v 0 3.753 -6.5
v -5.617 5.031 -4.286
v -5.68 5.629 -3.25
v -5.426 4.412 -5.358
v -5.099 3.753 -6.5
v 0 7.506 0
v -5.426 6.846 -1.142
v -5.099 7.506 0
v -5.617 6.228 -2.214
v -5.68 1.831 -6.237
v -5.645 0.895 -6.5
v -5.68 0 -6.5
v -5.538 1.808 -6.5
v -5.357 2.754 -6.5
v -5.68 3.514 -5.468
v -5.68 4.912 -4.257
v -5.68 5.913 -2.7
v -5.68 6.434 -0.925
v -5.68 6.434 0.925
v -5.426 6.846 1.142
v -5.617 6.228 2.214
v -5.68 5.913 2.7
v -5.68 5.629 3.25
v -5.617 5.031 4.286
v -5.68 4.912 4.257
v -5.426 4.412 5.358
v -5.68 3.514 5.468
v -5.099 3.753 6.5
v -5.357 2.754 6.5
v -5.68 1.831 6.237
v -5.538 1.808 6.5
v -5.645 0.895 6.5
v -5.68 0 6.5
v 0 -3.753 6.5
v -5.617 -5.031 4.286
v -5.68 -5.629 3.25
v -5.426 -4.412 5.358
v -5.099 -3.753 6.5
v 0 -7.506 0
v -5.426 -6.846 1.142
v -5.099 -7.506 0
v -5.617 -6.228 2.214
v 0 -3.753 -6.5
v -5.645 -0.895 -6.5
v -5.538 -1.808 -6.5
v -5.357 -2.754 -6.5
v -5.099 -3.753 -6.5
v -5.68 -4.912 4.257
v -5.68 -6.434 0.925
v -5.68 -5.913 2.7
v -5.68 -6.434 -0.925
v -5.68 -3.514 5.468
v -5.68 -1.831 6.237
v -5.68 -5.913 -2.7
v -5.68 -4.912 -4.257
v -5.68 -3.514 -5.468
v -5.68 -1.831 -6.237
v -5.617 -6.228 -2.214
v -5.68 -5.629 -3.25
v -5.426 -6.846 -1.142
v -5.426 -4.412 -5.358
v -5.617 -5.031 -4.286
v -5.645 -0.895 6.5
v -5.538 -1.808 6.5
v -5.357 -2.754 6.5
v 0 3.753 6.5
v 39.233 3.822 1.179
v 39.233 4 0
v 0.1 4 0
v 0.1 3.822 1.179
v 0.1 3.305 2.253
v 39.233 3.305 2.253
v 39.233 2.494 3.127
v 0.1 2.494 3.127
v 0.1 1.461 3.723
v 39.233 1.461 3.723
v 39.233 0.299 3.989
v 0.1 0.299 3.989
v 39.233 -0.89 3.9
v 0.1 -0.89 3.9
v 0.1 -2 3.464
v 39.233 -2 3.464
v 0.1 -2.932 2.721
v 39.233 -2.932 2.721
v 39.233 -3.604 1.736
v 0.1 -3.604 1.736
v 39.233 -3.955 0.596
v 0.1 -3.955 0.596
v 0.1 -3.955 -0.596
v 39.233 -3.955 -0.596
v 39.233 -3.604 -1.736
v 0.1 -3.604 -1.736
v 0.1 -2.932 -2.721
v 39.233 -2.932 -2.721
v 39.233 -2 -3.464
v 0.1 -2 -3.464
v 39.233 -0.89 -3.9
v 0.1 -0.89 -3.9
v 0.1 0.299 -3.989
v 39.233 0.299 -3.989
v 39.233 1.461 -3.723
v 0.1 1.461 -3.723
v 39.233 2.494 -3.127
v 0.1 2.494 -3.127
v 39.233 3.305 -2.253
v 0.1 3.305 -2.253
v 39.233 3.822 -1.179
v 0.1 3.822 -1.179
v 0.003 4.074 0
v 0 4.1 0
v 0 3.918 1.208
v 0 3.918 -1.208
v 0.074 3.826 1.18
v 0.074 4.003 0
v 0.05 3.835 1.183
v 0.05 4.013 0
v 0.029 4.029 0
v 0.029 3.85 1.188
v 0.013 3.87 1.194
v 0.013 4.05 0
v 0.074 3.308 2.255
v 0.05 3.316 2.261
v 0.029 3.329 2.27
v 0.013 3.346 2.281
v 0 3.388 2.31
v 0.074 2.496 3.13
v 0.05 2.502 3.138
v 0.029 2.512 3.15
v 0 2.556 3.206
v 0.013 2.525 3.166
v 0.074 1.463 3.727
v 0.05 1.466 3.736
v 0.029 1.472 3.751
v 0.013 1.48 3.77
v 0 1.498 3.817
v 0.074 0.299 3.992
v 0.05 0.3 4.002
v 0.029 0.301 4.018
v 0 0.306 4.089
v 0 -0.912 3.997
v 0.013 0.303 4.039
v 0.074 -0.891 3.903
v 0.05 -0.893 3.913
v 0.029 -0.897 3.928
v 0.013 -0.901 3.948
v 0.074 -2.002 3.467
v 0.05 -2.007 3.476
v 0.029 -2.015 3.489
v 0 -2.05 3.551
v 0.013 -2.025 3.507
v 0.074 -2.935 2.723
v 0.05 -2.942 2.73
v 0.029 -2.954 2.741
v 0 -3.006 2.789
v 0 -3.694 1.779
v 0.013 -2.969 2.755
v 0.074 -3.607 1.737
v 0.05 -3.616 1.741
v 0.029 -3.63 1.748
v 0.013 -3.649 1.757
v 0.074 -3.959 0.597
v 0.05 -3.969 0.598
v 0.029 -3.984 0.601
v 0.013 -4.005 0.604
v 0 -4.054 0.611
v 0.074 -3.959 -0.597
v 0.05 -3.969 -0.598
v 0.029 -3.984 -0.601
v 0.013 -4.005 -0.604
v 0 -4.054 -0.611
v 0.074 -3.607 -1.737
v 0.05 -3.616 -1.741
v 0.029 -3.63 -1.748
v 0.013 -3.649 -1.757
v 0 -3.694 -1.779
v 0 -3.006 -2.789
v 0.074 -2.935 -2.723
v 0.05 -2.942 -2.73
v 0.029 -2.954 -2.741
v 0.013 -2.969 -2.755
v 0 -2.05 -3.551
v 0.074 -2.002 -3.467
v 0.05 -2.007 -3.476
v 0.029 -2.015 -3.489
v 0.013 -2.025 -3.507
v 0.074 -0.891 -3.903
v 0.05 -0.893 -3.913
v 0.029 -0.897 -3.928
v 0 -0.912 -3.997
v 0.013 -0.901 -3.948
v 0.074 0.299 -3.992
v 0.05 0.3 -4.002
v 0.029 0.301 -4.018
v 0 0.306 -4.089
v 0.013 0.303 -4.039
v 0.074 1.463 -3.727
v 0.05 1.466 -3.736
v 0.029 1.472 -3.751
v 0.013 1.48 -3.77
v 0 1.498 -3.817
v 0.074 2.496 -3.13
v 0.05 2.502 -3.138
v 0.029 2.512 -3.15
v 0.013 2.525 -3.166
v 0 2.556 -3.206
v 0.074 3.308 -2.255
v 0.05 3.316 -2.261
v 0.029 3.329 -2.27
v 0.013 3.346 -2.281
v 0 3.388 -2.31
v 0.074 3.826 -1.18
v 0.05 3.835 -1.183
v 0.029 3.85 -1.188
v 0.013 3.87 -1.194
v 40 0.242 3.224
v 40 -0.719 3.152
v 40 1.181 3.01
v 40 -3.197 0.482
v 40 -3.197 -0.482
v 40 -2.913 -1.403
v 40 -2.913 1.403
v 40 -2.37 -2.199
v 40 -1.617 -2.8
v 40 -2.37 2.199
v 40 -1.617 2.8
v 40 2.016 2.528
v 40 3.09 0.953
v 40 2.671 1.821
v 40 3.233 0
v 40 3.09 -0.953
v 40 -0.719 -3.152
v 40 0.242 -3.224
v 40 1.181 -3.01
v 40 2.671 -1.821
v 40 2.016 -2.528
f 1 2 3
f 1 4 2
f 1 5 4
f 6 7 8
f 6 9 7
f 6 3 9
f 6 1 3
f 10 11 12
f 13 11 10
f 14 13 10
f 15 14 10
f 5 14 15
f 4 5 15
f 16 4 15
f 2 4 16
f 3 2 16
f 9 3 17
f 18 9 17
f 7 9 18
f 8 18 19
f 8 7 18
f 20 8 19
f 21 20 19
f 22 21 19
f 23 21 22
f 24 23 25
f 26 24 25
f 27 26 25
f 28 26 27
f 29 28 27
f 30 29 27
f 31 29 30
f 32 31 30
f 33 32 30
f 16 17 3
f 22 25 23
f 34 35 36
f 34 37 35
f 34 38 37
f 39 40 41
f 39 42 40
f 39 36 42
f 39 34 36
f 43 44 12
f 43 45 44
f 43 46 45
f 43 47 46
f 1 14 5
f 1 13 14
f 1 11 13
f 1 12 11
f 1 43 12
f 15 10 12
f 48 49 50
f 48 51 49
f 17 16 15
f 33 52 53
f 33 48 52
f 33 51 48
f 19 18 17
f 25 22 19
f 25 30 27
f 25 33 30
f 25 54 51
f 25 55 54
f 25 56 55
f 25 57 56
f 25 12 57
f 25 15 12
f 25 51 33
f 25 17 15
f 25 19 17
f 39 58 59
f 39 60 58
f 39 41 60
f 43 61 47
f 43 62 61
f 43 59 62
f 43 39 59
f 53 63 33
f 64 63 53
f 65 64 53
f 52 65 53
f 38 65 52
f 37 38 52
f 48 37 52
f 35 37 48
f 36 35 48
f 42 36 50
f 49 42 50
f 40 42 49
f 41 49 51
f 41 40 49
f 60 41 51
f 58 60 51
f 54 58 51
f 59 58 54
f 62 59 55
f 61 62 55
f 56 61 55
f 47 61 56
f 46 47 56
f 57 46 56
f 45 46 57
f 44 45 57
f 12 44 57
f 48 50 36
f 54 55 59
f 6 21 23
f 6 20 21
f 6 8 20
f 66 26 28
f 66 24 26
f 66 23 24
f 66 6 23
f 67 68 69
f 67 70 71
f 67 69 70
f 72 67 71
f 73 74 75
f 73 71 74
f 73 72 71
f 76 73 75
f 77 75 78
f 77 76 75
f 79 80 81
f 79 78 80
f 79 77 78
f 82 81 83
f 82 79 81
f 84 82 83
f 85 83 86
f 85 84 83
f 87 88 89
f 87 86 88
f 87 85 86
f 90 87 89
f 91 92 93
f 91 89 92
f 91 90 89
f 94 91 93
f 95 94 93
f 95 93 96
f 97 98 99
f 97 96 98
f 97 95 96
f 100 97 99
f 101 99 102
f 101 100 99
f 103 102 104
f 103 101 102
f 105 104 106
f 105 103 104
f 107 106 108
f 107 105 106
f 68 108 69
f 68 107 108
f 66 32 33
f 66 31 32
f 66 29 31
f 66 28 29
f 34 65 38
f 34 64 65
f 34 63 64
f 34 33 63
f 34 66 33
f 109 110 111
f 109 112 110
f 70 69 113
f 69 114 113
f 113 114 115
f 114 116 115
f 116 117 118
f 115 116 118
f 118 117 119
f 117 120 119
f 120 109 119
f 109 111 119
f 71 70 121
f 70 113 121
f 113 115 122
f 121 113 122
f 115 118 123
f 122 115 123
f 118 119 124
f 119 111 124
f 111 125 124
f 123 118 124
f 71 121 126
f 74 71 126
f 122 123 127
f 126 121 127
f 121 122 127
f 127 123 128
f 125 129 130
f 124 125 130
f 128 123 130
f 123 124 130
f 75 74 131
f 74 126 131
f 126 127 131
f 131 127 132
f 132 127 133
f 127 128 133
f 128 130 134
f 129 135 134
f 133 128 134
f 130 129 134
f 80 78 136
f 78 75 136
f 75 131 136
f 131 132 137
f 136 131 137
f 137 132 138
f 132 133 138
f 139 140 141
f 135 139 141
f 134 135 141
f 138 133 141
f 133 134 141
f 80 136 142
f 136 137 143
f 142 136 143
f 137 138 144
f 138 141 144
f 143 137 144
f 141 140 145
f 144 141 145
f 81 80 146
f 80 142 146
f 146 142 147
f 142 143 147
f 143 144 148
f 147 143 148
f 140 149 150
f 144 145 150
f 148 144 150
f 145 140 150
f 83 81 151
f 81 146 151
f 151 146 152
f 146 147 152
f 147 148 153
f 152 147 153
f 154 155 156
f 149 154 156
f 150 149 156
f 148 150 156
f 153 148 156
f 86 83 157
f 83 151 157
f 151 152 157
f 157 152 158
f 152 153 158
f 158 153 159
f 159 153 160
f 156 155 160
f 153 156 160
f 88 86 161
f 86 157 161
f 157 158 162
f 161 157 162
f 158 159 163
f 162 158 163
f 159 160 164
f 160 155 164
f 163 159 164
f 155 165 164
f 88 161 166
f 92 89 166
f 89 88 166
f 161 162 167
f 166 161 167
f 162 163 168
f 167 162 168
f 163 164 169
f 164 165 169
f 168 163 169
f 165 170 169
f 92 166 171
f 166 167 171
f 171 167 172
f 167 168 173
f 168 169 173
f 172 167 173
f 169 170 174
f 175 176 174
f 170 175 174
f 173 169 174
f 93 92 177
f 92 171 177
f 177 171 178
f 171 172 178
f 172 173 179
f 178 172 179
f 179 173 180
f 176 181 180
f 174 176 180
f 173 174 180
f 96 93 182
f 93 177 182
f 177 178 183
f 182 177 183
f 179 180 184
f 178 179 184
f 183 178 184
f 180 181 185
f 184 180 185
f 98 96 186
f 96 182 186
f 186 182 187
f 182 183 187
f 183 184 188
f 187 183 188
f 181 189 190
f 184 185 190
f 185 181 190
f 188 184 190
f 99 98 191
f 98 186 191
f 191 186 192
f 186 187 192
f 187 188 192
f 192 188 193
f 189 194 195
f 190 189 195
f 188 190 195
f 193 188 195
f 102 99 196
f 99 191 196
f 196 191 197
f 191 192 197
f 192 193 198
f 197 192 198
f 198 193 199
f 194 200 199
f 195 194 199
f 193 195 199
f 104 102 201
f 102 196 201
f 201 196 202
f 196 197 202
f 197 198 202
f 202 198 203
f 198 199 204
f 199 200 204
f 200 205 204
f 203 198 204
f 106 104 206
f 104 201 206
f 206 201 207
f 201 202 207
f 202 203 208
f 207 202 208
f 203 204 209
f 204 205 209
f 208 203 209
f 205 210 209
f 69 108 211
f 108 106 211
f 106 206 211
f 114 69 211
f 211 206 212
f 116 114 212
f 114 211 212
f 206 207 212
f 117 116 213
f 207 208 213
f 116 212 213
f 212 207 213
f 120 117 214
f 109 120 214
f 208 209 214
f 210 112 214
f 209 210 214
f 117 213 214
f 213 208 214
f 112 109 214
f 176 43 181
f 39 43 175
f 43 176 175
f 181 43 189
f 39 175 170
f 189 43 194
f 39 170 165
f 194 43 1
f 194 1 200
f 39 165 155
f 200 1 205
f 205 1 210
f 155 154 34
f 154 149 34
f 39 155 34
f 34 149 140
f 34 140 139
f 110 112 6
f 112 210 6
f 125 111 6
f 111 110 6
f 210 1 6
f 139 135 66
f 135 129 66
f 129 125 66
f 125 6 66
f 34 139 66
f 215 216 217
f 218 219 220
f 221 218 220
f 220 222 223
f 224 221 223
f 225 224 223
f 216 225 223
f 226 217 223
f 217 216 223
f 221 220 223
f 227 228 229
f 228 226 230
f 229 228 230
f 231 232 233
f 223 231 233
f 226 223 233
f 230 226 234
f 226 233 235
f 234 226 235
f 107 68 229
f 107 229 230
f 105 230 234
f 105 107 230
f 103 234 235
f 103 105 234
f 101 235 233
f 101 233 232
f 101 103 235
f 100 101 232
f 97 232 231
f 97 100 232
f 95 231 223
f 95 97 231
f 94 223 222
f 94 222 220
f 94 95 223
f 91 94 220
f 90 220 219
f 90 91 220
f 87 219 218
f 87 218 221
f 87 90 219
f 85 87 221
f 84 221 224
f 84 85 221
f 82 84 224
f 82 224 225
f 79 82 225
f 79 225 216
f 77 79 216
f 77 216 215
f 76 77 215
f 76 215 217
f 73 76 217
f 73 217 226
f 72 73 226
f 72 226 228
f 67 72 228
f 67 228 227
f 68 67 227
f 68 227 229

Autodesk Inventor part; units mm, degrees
ref_plane "YZ Plane" through (0, 0, 0) normal (1, 0, 0) x (0, 1, 0)
ref_plane "XZ Plane" through (0, 0, 0) normal (0, 1, 0) x (-1, 0, 0)
sketch "Sketch1" plane through (0, 0, 0) normal (0, 0, 1) x (1, 0, 0)
  line L0 (0, 4) -> (40, 4)
  line L1 (40, 4) -> (40, 0)
  line L2 (40, 0) -> (0, 0)
  line L3 (-8, 0) -> (48, 0) projected
  line L4 (0, -0.8) -> (0, 4.8) projected
  line L5 (0, 4) -> (0, 0)
  dimension "d2" = 8
  dimension "d59" = 40
revolve "Body" add sketch "Sketch1" angle 360 about axis through (40, 0, 0) along (-1, 0, 0)
sketch "Sketch2" plane through (0, 0, 0) normal (-1, 0, 0) x (0, 0, 1)
  line L0 (0, 7.5056) -> (6.5, 3.7528)
  line L1 (6.5, 3.7528) -> (6.5, -3.7528)
  line L2 (6.5, -3.7528) -> (0, -7.5056)
  line L3 (0, -7.5056) -> (-6.5, -3.7528)
  line L4 (-6.5, -3.7528) -> (-6.5, 3.7528)
  line L5 (-6.5, 3.7528) -> (0, 7.5056)
  line L6 (-9.1, 0) -> (9.1, 0) projected
  line L7 (0, 10.5078) -> (0, -10.5078) projected
  point P0 (0, 0)
  point P1 (0, 0)
  dimension "d11" = 13
extrude "Head" add sketch "Sketch2" along normal blind 5.68
sketch "Sketch4" plane through (0, 0, 0) normal (0, 0, 1) x (1, 0, 0)
  line L0 (-4.9294, 7.8) -> (-5.68, 6.5)
  line L1 (-1.1, 0) -> (-0.234, 0)
  line L2 (-6.7692, 0) -> (0.8552, 0) projected
  line L3 (-5.68, 7.8) -> (-4.9294, 7.8)
  line L4 (-5.68, 6.5) -> (-5.68, 7.8)
  line L5 (0, 9.36) -> (0, -1.56) projected
  dimension "d65" = 13
  dimension "d67" = 30
  dimension "d68" = 15.6
  dimension "d69" = 5.68
revolve "Chamfer1" cut sketch "Sketch4" angle 360 about axis through (-1.1, 0, 0) along (1, 0, 0)
thread "Thread" size "M8x1.25" class "6g" standard "ISO Metric profile" length 22
chamfer "Chamfer2" distance 0.7668 distance2 0.7669 1 edges at (40, -4, 0) measured on face at (40, 0.4453, 1.0204)
fillet "Fillet" radius 0.1 1 edges at (0, -4, 0)
ref_plane "Work Plane1" through (1.525, 0, 0) normal (0, 0, 1) x (1, 0, 0)
equation "\"d2\" = GD"
equation "\"d59\" = NLG"
equation "\"d11\" = SW"
equation "\"d3\" = KOH"
equation "\"d15\" = GEL"
equation "\"d6\" = -0.5 * SPD + 0.5 * GD"
equation "\"d71\" = RR"
equation "\"d65\" = SW"
equation "\"d67\" = ANG1"
equation "\"d68\" = 1.2 * SW"
equation "\"d69\" = KOH"
equation "\"NLG\" = 40"
equation "\"GD\" = NND"
equation "\"BDM\" = NND"
equation "\"KOH\" = 5.68"
equation "\"GEL\" = 22"
equation "\"SW\" = 13"
equation "\"SW0\" = SW"
equation "\"SPD\" = NND - 1.2269 * PTC"
equation "\"SD2\" = NND"
equation "\"SD\" = 0"
equation "\"ANG1\" = 30deg"
equation "\"GAL\" = 0.61345 * PTC"
equation "\"GUL\" = 0.61345 * PTC"
equation "\"RR\" = 0.1"
equation "\"RR1\" = 0.4"
equation "\"GD1\" = THREADDIA - 1.2269 * PTC"
equation "\"THREADDIA\" = 8"
equation "\"TOA\" = 30deg"
equation "\"PTC\" = 1.25"
equation "\"KOH1\" = 3.7"
equation "\"NND\" = 8"
equation "\"E0\" = 1.155 * SW"
properties part number "ANSI B18.2.3.5M - M8 x 1.25 x 40" material "Steel, Mild"
